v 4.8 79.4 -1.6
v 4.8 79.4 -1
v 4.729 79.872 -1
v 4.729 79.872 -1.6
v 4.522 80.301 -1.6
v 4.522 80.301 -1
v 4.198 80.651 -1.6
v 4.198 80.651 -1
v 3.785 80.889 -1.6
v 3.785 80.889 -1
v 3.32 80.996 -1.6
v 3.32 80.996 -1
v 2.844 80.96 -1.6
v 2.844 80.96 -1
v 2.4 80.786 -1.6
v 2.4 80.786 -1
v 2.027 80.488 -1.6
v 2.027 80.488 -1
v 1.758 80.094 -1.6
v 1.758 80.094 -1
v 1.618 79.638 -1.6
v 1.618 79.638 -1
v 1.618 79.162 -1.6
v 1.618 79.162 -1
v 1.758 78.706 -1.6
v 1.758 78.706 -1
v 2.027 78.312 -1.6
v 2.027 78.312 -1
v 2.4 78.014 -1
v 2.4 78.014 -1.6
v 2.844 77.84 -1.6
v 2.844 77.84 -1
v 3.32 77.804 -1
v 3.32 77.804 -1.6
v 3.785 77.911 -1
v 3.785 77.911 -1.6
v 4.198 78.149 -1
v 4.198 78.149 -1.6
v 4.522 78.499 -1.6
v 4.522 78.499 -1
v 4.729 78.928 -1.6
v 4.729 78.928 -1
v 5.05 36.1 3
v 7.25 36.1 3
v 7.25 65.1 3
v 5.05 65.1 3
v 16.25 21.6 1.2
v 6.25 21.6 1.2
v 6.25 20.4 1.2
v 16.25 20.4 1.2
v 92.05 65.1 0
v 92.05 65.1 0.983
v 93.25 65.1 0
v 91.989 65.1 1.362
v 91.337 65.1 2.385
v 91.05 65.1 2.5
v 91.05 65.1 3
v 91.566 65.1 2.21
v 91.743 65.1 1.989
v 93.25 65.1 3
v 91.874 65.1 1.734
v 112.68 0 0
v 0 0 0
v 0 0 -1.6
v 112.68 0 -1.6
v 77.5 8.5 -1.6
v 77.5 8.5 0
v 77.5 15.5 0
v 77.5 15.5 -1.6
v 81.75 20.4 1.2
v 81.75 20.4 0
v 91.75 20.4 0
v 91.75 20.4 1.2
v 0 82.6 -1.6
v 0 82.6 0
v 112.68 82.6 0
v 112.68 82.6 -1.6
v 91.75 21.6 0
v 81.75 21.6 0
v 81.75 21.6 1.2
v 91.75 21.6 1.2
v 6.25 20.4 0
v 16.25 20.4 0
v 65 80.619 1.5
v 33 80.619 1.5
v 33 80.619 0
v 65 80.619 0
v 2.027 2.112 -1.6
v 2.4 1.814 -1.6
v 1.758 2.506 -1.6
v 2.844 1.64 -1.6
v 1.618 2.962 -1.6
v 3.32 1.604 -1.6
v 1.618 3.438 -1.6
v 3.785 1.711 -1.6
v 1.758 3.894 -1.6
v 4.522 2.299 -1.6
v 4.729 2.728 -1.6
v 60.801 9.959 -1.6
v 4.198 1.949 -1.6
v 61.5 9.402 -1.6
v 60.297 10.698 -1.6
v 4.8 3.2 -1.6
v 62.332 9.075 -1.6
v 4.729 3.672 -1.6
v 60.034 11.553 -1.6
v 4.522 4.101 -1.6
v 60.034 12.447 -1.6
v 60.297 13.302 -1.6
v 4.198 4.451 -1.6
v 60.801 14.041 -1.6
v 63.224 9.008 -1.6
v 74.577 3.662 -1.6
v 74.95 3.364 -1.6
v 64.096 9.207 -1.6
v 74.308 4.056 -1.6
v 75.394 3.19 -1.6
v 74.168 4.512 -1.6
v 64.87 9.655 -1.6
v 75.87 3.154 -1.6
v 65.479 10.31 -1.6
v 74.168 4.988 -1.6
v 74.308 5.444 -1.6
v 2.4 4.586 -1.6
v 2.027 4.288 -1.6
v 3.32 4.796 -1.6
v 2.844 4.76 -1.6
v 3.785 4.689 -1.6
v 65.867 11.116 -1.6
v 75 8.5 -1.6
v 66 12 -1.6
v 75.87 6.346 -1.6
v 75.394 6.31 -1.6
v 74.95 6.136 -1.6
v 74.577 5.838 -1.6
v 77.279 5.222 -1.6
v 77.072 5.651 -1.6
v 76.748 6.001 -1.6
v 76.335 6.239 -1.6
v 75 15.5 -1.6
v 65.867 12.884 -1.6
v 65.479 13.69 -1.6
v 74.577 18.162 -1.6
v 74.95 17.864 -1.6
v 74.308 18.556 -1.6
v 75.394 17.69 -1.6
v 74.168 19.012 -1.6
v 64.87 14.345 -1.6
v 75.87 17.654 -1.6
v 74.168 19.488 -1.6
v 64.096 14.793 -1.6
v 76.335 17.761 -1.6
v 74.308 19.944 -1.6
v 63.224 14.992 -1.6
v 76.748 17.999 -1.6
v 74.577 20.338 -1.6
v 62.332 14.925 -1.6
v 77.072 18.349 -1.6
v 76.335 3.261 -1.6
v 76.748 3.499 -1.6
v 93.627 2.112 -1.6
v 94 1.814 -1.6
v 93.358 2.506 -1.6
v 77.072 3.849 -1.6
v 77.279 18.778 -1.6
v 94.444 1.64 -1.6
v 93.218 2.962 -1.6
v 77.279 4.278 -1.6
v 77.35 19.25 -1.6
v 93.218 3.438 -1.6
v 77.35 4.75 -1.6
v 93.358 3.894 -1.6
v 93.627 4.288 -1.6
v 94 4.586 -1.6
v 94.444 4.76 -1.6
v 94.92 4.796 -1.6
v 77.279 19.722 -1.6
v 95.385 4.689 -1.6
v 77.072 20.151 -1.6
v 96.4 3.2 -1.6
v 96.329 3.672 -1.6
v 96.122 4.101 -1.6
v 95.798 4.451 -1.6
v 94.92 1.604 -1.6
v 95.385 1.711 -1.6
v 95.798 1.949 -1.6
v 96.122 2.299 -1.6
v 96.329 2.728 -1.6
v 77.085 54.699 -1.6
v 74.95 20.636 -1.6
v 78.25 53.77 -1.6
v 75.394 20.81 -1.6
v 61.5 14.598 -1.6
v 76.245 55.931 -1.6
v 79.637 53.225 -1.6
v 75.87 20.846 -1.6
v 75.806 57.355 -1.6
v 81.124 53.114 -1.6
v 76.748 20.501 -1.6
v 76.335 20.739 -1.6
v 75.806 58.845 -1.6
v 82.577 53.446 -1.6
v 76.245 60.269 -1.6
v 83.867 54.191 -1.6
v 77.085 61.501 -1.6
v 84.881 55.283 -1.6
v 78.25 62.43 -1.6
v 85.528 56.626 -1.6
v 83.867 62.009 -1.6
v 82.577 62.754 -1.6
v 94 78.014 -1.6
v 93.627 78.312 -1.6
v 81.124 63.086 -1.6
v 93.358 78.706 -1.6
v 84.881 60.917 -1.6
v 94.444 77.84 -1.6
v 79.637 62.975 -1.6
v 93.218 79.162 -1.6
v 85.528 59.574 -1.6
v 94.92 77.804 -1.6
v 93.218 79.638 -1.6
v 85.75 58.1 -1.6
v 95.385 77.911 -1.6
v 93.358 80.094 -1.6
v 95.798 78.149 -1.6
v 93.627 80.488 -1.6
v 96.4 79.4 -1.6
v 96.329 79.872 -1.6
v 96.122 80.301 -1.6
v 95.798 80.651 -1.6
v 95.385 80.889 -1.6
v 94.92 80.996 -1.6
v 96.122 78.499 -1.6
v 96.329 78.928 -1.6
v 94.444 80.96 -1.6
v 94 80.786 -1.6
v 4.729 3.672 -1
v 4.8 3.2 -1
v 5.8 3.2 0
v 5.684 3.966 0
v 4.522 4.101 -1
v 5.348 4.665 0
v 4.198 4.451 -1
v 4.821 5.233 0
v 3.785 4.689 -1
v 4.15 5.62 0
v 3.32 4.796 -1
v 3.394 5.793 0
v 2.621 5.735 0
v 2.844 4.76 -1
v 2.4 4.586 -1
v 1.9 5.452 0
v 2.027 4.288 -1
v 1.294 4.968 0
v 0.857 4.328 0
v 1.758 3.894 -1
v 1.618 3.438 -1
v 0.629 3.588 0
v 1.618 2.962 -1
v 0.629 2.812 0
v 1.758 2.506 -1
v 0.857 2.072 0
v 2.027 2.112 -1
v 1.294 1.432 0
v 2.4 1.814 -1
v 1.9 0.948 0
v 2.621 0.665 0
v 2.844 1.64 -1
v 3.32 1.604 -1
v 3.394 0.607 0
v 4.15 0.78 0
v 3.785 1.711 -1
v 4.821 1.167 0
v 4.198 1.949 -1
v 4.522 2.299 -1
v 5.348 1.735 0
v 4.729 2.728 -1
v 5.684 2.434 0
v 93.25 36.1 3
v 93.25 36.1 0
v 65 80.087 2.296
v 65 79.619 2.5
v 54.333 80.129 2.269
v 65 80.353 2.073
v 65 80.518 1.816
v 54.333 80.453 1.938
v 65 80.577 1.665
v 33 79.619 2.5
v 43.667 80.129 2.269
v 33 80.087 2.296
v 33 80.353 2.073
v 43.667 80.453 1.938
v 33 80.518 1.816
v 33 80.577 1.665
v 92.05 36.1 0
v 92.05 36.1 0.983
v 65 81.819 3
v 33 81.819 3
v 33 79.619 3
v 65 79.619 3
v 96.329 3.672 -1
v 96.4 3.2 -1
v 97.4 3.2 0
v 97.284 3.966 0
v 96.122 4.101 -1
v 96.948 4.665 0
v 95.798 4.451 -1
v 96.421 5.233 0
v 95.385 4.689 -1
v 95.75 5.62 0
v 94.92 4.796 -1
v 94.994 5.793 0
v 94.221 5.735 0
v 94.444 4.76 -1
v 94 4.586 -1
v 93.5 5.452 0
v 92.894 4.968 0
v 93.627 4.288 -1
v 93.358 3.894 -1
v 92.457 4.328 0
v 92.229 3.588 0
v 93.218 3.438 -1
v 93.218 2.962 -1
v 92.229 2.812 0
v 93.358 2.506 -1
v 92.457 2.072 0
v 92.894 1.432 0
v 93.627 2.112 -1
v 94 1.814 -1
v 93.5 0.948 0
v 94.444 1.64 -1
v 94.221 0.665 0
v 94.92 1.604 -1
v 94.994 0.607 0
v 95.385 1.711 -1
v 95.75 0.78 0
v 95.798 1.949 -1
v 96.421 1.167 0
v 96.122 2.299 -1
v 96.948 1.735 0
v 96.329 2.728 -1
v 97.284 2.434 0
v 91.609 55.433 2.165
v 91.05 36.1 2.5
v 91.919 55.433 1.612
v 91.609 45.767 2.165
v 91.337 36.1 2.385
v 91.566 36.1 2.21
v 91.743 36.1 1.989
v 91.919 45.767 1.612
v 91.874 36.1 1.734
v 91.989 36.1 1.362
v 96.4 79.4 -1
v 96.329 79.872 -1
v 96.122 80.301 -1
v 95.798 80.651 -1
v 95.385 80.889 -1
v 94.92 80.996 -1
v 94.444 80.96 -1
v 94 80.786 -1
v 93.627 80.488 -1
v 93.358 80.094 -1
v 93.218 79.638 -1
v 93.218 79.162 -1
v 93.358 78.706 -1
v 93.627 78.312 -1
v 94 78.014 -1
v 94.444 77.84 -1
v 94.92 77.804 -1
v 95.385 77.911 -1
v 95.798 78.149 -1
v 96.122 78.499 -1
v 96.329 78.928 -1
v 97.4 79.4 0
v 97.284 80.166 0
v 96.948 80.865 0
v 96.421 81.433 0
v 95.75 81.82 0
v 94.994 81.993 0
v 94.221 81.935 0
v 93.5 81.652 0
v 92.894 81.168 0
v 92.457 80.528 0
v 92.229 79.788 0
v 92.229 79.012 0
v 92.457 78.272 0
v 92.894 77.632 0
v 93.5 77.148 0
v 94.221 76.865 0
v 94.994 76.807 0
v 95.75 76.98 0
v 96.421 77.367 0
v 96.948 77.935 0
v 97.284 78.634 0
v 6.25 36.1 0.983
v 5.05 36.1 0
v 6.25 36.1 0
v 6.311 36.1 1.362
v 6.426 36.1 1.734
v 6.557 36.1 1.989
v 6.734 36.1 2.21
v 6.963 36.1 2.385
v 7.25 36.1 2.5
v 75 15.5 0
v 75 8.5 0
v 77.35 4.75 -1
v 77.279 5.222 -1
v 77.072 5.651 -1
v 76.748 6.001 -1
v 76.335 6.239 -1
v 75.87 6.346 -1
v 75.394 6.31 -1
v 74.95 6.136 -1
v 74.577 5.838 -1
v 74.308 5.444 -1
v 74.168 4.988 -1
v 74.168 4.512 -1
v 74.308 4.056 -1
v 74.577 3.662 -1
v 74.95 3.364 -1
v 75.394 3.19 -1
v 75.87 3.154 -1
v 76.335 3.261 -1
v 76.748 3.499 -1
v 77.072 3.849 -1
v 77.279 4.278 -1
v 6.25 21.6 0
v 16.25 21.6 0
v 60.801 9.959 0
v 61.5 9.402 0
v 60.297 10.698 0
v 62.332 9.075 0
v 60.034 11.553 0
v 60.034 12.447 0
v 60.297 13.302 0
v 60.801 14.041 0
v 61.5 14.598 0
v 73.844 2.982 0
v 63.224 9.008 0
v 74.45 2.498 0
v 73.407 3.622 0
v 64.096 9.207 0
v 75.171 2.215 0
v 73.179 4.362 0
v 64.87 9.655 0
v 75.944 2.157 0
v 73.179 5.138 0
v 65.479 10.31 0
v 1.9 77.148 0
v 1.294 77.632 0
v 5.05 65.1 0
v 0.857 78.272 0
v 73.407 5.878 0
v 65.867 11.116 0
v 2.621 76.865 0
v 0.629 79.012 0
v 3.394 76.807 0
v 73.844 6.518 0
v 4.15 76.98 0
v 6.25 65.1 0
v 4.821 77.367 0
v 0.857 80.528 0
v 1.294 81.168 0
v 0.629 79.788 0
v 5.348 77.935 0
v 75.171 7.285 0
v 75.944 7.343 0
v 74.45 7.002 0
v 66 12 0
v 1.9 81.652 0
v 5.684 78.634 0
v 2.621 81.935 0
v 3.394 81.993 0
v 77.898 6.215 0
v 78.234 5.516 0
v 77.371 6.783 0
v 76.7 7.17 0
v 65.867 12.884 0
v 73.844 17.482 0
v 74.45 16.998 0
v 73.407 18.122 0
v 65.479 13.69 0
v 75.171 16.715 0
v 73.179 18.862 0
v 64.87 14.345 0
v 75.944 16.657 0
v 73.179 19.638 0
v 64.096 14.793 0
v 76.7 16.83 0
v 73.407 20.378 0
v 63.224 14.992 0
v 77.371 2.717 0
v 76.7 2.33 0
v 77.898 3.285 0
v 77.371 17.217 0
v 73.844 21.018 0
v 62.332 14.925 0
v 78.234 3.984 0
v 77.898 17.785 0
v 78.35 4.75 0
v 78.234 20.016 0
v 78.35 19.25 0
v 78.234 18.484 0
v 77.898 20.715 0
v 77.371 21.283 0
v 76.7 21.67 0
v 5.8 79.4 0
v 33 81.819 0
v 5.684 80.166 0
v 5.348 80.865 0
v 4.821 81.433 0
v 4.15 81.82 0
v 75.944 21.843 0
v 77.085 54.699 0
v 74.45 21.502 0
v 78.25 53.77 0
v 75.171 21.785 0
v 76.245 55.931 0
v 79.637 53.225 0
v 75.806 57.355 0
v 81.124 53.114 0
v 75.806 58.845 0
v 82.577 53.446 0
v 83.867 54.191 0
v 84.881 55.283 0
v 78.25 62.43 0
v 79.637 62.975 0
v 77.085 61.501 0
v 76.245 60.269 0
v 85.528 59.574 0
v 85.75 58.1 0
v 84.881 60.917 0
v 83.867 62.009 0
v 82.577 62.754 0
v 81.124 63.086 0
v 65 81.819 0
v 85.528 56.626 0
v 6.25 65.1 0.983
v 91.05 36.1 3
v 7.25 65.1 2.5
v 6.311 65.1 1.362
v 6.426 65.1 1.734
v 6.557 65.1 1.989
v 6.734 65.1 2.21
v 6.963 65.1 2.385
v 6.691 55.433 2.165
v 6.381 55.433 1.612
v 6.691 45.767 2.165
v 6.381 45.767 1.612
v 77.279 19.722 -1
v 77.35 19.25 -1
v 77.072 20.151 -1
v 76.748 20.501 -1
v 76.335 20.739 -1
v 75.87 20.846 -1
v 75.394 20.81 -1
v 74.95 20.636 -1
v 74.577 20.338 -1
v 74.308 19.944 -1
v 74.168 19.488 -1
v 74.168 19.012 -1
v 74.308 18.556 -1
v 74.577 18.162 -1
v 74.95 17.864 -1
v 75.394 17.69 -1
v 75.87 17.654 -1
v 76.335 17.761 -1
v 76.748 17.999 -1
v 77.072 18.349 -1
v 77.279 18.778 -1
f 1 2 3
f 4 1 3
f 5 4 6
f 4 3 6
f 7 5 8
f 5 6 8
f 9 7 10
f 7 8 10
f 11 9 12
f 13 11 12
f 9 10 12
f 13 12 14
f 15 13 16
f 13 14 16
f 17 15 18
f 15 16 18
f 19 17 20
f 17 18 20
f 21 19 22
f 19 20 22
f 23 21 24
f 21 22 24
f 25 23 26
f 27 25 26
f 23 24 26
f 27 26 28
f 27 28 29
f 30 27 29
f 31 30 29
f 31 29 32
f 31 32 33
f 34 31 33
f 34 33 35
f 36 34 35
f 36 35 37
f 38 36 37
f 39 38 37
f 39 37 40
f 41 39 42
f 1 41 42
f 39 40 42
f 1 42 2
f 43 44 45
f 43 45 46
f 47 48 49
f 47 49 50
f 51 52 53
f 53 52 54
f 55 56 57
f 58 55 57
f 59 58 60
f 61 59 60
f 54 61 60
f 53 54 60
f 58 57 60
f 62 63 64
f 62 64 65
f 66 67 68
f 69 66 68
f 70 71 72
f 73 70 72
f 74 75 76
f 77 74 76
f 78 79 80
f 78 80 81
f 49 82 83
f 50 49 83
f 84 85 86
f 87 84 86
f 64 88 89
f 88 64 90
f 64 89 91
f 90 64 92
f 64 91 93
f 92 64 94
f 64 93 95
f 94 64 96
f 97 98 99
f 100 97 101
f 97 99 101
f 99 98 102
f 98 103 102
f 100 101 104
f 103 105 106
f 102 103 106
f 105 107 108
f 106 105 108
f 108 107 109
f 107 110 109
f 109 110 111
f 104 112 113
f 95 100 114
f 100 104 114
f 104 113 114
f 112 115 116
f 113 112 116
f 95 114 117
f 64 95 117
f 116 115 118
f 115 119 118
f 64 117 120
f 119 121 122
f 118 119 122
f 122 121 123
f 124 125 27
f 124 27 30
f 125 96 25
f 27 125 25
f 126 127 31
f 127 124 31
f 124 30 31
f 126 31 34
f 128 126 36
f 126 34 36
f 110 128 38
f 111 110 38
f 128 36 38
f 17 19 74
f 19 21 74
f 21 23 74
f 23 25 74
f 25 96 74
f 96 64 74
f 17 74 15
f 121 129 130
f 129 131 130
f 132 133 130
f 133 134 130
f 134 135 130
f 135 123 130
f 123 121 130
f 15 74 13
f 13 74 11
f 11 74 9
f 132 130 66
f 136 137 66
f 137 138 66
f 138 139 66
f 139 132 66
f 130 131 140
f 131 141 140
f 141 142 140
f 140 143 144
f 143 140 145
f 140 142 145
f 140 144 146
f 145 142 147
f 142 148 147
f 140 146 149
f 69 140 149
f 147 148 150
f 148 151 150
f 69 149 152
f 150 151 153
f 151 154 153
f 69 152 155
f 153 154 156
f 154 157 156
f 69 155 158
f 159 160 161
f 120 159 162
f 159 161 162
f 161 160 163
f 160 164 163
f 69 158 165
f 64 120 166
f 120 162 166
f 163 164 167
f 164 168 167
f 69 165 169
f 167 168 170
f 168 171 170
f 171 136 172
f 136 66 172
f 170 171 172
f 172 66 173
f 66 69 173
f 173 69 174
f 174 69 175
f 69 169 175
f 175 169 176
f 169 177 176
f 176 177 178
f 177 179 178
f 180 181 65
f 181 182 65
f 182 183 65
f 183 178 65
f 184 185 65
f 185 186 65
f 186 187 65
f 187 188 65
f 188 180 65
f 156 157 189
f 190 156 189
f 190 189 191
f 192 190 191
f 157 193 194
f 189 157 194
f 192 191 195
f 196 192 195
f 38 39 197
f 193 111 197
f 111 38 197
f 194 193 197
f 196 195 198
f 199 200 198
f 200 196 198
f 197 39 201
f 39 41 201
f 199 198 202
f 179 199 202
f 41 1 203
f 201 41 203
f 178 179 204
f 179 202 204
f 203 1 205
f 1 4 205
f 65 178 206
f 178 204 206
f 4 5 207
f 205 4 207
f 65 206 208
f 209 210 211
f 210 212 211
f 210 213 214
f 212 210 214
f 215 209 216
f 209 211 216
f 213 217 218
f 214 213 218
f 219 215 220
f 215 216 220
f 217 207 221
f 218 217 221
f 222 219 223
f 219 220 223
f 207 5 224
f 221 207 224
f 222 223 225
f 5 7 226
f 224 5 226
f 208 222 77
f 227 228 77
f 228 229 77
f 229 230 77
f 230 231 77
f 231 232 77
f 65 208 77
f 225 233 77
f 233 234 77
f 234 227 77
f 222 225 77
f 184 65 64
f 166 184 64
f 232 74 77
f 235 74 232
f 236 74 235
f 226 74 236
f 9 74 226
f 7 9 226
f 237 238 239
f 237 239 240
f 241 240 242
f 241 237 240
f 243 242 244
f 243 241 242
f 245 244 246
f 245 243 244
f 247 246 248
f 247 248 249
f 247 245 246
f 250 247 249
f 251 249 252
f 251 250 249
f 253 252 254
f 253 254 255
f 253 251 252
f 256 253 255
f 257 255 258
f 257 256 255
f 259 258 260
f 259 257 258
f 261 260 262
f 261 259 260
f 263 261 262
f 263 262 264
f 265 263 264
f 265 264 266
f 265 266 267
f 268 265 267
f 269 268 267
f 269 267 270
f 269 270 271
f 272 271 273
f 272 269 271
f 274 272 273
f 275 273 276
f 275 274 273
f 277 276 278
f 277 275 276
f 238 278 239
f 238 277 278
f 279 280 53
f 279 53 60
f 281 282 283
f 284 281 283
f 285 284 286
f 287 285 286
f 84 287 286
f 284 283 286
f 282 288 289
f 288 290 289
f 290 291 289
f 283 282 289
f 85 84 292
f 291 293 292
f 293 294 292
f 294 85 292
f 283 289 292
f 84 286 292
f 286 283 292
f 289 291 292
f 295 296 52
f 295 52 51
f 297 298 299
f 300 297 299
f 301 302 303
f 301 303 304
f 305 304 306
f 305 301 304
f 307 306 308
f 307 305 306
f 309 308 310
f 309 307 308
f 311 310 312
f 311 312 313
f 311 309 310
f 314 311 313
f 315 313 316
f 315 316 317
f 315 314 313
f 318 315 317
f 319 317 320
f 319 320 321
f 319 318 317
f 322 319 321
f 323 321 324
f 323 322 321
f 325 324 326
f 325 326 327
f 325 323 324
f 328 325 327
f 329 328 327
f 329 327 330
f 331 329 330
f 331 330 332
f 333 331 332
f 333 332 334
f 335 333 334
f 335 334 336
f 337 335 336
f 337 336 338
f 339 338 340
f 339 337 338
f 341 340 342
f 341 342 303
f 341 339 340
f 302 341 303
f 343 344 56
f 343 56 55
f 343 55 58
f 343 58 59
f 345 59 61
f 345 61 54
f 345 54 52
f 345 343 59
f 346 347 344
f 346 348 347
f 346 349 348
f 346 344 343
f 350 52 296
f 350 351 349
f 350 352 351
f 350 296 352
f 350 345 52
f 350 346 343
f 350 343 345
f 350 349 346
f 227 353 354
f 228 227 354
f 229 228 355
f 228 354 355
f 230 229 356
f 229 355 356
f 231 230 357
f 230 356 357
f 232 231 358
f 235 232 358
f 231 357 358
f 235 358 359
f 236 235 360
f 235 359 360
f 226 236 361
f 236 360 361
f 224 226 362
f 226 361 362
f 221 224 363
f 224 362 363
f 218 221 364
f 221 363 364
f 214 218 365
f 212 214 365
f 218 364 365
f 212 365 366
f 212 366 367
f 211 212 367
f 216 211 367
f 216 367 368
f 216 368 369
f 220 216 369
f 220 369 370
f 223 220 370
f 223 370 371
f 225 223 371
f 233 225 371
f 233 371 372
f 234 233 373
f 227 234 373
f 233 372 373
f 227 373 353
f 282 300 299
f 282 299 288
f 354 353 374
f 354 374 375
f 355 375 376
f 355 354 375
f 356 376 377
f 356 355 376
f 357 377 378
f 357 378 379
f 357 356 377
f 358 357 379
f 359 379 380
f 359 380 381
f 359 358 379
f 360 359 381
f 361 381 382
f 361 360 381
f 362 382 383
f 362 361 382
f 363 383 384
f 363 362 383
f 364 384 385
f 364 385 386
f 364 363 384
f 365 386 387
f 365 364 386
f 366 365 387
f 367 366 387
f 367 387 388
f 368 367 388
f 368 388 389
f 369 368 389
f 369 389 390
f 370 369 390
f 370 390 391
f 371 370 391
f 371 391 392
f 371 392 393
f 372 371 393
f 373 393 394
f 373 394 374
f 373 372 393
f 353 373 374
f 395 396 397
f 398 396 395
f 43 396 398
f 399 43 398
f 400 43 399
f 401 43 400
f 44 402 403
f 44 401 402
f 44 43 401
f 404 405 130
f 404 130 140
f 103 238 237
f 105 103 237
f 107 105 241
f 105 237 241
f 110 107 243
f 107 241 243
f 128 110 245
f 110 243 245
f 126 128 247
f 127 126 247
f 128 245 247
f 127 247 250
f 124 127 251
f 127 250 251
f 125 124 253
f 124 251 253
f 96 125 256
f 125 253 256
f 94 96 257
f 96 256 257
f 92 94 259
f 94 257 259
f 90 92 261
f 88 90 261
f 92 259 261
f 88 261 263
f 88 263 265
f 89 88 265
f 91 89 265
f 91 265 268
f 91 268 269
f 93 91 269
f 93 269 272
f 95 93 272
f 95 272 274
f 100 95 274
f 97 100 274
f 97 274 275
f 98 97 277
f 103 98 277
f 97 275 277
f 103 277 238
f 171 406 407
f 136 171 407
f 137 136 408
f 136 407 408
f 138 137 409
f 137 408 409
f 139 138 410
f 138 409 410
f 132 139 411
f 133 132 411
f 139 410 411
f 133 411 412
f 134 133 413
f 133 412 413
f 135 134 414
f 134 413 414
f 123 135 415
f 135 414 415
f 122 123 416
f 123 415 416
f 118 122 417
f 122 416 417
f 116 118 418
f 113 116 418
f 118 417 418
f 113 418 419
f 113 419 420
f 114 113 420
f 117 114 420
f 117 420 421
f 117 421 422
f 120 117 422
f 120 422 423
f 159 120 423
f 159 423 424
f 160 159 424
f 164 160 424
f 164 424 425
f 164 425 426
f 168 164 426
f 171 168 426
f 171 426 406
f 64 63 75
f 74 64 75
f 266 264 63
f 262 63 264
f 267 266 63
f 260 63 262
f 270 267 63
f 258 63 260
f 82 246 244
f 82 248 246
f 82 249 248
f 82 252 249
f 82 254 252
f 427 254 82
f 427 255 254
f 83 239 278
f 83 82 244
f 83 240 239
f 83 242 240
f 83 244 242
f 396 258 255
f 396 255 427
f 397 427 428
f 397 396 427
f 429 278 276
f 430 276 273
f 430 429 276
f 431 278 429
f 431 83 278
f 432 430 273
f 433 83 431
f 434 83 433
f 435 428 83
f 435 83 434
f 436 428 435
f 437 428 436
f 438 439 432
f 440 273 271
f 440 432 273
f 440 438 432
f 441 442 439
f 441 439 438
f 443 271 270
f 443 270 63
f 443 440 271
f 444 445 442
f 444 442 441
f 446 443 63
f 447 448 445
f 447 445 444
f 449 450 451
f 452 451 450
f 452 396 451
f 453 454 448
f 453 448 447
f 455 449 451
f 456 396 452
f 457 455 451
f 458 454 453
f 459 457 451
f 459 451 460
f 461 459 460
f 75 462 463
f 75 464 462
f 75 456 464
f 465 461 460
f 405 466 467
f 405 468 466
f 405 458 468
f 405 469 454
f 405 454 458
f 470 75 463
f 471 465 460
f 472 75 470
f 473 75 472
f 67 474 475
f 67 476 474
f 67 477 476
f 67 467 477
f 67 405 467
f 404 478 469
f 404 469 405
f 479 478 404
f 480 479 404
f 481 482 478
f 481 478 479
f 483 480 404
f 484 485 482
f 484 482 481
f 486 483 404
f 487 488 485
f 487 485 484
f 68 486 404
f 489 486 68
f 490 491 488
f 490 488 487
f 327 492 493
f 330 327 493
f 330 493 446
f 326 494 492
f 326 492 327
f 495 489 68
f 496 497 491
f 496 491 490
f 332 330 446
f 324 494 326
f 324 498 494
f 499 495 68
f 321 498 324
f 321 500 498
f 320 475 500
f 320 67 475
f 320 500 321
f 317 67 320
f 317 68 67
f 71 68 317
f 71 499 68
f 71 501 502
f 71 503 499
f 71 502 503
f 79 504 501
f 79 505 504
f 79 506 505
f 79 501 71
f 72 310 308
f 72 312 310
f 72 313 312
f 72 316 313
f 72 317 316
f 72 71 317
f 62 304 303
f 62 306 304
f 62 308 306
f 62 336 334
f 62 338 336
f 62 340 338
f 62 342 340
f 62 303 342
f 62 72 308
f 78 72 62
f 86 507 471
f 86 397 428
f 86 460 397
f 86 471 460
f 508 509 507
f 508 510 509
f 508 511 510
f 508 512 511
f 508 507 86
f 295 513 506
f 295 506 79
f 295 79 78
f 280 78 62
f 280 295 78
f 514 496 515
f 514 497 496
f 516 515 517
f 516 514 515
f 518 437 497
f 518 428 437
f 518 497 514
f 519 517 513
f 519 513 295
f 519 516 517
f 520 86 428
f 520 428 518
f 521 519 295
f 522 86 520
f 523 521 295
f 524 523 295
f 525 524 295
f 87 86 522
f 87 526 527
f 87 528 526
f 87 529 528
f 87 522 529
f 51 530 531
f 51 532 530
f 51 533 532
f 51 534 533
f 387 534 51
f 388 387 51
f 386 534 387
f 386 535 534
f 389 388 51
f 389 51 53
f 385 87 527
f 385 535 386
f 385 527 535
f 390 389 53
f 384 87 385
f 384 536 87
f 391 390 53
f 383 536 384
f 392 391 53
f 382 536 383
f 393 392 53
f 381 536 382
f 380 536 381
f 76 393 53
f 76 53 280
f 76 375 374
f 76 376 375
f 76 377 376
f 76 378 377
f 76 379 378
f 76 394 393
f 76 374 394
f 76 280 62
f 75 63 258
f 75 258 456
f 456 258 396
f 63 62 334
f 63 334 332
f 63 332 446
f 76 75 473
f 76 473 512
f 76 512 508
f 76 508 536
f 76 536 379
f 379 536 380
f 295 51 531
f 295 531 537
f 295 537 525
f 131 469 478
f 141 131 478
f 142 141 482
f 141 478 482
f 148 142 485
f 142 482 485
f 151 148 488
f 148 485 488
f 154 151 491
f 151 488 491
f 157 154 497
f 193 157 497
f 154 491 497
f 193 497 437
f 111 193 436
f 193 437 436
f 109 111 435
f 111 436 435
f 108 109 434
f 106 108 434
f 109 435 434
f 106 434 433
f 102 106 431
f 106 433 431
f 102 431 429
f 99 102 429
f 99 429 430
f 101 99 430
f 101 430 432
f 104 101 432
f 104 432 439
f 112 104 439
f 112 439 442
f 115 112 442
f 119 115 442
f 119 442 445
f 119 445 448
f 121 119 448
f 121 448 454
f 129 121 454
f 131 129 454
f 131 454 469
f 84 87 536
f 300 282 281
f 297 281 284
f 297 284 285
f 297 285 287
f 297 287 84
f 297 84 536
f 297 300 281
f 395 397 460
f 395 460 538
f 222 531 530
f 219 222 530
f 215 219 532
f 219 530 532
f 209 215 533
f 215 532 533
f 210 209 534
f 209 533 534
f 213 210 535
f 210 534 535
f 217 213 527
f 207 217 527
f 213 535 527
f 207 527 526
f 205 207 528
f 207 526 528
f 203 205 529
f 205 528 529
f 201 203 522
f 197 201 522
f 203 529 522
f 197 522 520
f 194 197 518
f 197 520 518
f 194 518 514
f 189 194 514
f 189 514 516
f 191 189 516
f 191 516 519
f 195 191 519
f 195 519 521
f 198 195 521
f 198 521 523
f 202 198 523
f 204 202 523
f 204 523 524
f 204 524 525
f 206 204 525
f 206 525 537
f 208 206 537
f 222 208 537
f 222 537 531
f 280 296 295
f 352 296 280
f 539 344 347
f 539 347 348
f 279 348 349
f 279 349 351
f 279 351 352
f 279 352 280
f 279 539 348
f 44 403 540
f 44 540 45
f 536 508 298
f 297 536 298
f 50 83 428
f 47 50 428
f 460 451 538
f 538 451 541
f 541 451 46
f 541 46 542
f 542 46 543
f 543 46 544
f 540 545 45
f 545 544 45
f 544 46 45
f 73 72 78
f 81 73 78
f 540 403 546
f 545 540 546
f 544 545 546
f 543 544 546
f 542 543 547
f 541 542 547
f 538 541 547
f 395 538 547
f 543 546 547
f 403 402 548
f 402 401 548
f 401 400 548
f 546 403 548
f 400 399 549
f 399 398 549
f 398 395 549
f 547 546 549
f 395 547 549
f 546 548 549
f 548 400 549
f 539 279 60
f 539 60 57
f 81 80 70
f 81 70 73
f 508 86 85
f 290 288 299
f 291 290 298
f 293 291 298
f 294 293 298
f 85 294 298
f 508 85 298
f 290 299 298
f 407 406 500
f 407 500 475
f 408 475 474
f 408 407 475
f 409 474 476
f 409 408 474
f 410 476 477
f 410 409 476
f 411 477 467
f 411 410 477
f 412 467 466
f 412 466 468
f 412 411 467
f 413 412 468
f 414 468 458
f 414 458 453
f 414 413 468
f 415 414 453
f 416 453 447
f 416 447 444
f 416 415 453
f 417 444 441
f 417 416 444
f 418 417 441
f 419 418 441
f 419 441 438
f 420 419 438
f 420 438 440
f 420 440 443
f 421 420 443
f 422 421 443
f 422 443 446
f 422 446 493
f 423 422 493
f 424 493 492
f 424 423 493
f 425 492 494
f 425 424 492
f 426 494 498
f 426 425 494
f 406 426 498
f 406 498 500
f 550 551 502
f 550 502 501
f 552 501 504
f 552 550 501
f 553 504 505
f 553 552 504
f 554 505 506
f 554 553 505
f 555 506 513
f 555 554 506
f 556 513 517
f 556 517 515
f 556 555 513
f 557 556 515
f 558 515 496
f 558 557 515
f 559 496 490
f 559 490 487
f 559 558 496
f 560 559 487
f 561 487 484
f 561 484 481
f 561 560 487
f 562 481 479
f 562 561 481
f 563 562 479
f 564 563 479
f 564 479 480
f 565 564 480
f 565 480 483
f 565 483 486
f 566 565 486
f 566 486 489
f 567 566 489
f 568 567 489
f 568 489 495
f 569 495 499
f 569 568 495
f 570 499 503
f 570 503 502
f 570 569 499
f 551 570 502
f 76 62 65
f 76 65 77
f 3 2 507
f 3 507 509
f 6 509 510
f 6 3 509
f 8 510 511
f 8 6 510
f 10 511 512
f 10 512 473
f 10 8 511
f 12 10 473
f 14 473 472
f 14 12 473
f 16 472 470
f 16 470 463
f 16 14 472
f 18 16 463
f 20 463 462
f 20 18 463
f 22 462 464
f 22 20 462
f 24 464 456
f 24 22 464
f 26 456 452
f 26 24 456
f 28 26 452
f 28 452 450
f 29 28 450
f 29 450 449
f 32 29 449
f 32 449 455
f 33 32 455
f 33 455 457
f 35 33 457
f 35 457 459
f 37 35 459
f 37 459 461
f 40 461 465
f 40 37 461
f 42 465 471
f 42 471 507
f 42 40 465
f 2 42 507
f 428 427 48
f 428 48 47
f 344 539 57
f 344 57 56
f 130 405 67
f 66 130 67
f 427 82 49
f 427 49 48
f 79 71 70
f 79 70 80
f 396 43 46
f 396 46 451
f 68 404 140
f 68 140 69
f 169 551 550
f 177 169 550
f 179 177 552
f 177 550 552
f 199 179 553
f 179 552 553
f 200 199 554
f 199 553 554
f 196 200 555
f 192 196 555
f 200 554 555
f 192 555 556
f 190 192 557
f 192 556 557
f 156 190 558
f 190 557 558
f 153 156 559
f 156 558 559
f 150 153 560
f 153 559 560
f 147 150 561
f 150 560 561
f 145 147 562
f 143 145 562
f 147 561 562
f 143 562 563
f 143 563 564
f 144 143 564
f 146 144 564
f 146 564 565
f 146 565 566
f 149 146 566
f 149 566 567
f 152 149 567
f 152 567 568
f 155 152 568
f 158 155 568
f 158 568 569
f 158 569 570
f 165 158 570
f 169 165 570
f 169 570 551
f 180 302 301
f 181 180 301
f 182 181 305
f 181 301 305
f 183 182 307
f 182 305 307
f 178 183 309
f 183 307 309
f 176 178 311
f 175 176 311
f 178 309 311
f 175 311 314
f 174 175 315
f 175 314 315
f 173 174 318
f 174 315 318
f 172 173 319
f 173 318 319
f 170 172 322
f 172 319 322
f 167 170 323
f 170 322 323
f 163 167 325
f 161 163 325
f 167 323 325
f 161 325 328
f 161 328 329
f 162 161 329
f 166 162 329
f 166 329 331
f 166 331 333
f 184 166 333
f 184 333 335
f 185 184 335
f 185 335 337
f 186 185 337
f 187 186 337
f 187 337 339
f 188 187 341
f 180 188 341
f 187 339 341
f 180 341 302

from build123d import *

# Parameters (mm, degrees)
F0_W      = 112.68
F0_H      = 82.6
F0_R      = 1.6
F3_DEPTH  = 1.6
F1_R      = 5
F4_DEPTH  = 1.601
F2_R      = 1.6
F2_R_2    = 3
F2_W      = 2.5
F2_H      = 7
F5_DEPTH  = 1.601
F7_START  = -36.1
F7_DEPTH  = 29
F9_START  = 33
F9_DEPTH  = 32
F1_W      = 10
F1_H      = 1.2
F10_DEPTH = 1.2
F11_SIZE  = 1


with BuildPart() as f3:
    # F0 (on Top) → F3 (new body)
    with BuildSketch(Plane.XY):
        with Locations((56.34, 41.3)):
            Rectangle(F0_W, F0_H)
        with Locations((3.2, 3.2)):
            Circle(F0_R, mode=Mode.SUBTRACT)
        with Locations((94.8, 3.2)):
            Circle(F0_R, mode=Mode.SUBTRACT)
        with Locations((3.2, 79.4)):
            Circle(F0_R, mode=Mode.SUBTRACT)
        with Locations((94.8, 79.4)):
            Circle(F0_R, mode=Mode.SUBTRACT)
    extrude(amount=-F3_DEPTH)

    # F1 (on face) → F4 (cut, through all)
    with BuildSketch(Plane.XY):
        with Locations((80.75, 58.1)):
            Circle(F1_R)
    extrude(amount=-F4_DEPTH, mode=Mode.SUBTRACT)

    # F2 (on face) → F5 (cut, through all)
    with BuildSketch(Plane.XY):
        with Locations((75.75, 4.75)):
            Circle(F2_R)
        with Locations((63, 12)):
            Circle(F2_R_2)
        with Locations((76.25, 12)):
            Rectangle(F2_W, F2_H)
        with Locations((75.75, 19.25)):
            Circle(F2_R)
    extrude(amount=-F5_DEPTH, mode=Mode.SUBTRACT)

    # F6 (on Front) → F7 (join)
    with BuildSketch(Plane.XZ.offset(F7_START)):
        with BuildLine():
            add(Edge.make_bspline(
                [(6.25, 0.9831411553), (6.1998556443, 0.4976120788), (6.25, 0.0696883488), (6.25, 0)],
                knots=[1.5113210061, 1.5113210061, 1.5113210061, 1.5113210061, 2.6925824036, 2.6925824036, 2.6925824036, 2.6925824036], degree=3))
            Line((6.25, 0), (6.25, 0.9831411553))
        make_face()
        with BuildLine():
            Line((5.05, 0), (6.25, 0))
            add(Edge.make_bspline(
                [(6.25, 0.9831411553), (6.1998556443, 0.4976120788), (6.25, 0.0696883488), (6.25, 0)],
                knots=[1.5113210061, 1.5113210061, 1.5113210061, 1.5113210061, 2.6925824036, 2.6925824036, 2.6925824036, 2.6925824036], degree=3))
            Line((6.25, 0.9831411553), (6.25, 3))
            Line((6.25, 3), (5.05, 3))
            Line((5.05, 3), (5.05, 0))
        make_face()
        with BuildLine():
            Line((6.25, 3), (6.25, 0.9831411553))
            add(Edge.make_bspline(
                [(7.25, 2.5), (6.5424729796, 2.3198194624), (6.3141553328, 1.6043332928), (6.25, 0.9831411553)],
                knots=[0, 0, 0, 0, 1.5113210061, 1.5113210061, 1.5113210061, 1.5113210061], degree=3))
            Line((7.25, 2.5), (7.25, 3))
            Line((7.25, 3), (6.25, 3))
        make_face()
        with BuildLine():
            Line((92.05, 0.9831411553), (92.05, 3))
            Line((92.05, 3), (91.05, 3))
            Line((91.05, 3), (91.05, 2.5))
            add(Edge.make_bspline(
                [(91.05, 2.5), (91.7575270204, 2.3198194624), (91.9858446672, 1.6043332928), (92.05, 0.9831411553)],
                knots=[0, 0, 0, 0, 1.5113210061, 1.5113210061, 1.5113210061, 1.5113210061], degree=3))
        make_face()
        with BuildLine():
            Line((93.25, 3), (92.05, 3))
            Line((92.05, 3), (92.05, 0.9831411553))
            add(Edge.make_bspline(
                [(92.05, 0.9831411553), (92.1001443557, 0.4976120788), (92.05, 0.0696883488), (92.05, 0)],
                knots=[1.5113210061, 1.5113210061, 1.5113210061, 1.5113210061, 2.6925824036, 2.6925824036, 2.6925824036, 2.6925824036], degree=3))
            Line((92.05, 0), (93.25, 0))
            Line((93.25, 0), (93.25, 3))
        make_face()
        with BuildLine():
            add(Edge.make_bspline(
                [(92.05, 0.9831411553), (92.1001443557, 0.4976120788), (92.05, 0.0696883488), (92.05, 0)],
                knots=[1.5113210061, 1.5113210061, 1.5113210061, 1.5113210061, 2.6925824036, 2.6925824036, 2.6925824036, 2.6925824036], degree=3))
            Line((92.05, 0.9831411553), (92.05, 0))
        make_face()
    extrude(amount=-F7_DEPTH)

    # F8 (on Right) → F9 (join)
    with BuildSketch(Plane.YZ.offset(F9_START)):
        with BuildLine():
            add(Edge.make_bspline(
                [(80.6190222502, 1.5), (80.7199138112, 0.9911874772), (80.6190222502, 0.2993458475), (80.6190222502, 0)],
                knots=[0.4926390921, 0.4926390921, 0.4926390921, 0.4926390921, 1, 1, 1, 1], degree=3))
            Line((80.6190222502, 0), (81.8190222502, 0))
            Line((81.8190222502, 0), (81.8190222502, 3))
            Line((81.8190222502, 3), (80.6190222502, 3))
            Line((80.6190222502, 3), (80.6190222502, 1.5))
        make_face()
        with BuildLine():
            Line((80.6190222502, 1.5), (80.6190222502, 0))
            add(Edge.make_bspline(
                [(80.6190222502, 1.5), (80.7199138112, 0.9911874772), (80.6190222502, 0.2993458475), (80.6190222502, 0)],
                knots=[0.4926390921, 0.4926390921, 0.4926390921, 0.4926390921, 1, 1, 1, 1], degree=3))
        make_face()
        with BuildLine():
            add(Edge.make_bspline(
                [(79.6190222502, 2.5), (80.2328512073, 2.3155356757), (80.5210582047, 1.9940485863), (80.6190222502, 1.5)],
                knots=[0, 0, 0, 0, 0.4926390921, 0.4926390921, 0.4926390921, 0.4926390921], degree=3))
            Line((80.6190222502, 1.5), (80.6190222502, 3))
            Line((80.6190222502, 3), (79.6190222502, 3))
            Line((79.6190222502, 3), (79.6190222502, 2.5))
        make_face()
    extrude(amount=F9_DEPTH)

    # F1 (on face) → F10 (join)
    with BuildSketch(Plane.XY):
        with Locations((11.25, 21)):
            Rectangle(F1_W, F1_H)
        with Locations((86.75, 21)):
            Rectangle(F1_W, F1_H)
    extrude(amount=F10_DEPTH)

    # F11
    f11_edges = [f3.edges().sort_by_distance(p)[0] for p in [
        (1.6, 79.4, 0),
        (1.6, 3.2, 0),
        (74.15, 4.75, 0),
        (74.15, 19.25, 0),
        (93.2, 3.2, 0),
        (93.2, 79.4, 0),
    ]]
    chamfer(f11_edges, length=F11_SIZE)


solid = f3.part
